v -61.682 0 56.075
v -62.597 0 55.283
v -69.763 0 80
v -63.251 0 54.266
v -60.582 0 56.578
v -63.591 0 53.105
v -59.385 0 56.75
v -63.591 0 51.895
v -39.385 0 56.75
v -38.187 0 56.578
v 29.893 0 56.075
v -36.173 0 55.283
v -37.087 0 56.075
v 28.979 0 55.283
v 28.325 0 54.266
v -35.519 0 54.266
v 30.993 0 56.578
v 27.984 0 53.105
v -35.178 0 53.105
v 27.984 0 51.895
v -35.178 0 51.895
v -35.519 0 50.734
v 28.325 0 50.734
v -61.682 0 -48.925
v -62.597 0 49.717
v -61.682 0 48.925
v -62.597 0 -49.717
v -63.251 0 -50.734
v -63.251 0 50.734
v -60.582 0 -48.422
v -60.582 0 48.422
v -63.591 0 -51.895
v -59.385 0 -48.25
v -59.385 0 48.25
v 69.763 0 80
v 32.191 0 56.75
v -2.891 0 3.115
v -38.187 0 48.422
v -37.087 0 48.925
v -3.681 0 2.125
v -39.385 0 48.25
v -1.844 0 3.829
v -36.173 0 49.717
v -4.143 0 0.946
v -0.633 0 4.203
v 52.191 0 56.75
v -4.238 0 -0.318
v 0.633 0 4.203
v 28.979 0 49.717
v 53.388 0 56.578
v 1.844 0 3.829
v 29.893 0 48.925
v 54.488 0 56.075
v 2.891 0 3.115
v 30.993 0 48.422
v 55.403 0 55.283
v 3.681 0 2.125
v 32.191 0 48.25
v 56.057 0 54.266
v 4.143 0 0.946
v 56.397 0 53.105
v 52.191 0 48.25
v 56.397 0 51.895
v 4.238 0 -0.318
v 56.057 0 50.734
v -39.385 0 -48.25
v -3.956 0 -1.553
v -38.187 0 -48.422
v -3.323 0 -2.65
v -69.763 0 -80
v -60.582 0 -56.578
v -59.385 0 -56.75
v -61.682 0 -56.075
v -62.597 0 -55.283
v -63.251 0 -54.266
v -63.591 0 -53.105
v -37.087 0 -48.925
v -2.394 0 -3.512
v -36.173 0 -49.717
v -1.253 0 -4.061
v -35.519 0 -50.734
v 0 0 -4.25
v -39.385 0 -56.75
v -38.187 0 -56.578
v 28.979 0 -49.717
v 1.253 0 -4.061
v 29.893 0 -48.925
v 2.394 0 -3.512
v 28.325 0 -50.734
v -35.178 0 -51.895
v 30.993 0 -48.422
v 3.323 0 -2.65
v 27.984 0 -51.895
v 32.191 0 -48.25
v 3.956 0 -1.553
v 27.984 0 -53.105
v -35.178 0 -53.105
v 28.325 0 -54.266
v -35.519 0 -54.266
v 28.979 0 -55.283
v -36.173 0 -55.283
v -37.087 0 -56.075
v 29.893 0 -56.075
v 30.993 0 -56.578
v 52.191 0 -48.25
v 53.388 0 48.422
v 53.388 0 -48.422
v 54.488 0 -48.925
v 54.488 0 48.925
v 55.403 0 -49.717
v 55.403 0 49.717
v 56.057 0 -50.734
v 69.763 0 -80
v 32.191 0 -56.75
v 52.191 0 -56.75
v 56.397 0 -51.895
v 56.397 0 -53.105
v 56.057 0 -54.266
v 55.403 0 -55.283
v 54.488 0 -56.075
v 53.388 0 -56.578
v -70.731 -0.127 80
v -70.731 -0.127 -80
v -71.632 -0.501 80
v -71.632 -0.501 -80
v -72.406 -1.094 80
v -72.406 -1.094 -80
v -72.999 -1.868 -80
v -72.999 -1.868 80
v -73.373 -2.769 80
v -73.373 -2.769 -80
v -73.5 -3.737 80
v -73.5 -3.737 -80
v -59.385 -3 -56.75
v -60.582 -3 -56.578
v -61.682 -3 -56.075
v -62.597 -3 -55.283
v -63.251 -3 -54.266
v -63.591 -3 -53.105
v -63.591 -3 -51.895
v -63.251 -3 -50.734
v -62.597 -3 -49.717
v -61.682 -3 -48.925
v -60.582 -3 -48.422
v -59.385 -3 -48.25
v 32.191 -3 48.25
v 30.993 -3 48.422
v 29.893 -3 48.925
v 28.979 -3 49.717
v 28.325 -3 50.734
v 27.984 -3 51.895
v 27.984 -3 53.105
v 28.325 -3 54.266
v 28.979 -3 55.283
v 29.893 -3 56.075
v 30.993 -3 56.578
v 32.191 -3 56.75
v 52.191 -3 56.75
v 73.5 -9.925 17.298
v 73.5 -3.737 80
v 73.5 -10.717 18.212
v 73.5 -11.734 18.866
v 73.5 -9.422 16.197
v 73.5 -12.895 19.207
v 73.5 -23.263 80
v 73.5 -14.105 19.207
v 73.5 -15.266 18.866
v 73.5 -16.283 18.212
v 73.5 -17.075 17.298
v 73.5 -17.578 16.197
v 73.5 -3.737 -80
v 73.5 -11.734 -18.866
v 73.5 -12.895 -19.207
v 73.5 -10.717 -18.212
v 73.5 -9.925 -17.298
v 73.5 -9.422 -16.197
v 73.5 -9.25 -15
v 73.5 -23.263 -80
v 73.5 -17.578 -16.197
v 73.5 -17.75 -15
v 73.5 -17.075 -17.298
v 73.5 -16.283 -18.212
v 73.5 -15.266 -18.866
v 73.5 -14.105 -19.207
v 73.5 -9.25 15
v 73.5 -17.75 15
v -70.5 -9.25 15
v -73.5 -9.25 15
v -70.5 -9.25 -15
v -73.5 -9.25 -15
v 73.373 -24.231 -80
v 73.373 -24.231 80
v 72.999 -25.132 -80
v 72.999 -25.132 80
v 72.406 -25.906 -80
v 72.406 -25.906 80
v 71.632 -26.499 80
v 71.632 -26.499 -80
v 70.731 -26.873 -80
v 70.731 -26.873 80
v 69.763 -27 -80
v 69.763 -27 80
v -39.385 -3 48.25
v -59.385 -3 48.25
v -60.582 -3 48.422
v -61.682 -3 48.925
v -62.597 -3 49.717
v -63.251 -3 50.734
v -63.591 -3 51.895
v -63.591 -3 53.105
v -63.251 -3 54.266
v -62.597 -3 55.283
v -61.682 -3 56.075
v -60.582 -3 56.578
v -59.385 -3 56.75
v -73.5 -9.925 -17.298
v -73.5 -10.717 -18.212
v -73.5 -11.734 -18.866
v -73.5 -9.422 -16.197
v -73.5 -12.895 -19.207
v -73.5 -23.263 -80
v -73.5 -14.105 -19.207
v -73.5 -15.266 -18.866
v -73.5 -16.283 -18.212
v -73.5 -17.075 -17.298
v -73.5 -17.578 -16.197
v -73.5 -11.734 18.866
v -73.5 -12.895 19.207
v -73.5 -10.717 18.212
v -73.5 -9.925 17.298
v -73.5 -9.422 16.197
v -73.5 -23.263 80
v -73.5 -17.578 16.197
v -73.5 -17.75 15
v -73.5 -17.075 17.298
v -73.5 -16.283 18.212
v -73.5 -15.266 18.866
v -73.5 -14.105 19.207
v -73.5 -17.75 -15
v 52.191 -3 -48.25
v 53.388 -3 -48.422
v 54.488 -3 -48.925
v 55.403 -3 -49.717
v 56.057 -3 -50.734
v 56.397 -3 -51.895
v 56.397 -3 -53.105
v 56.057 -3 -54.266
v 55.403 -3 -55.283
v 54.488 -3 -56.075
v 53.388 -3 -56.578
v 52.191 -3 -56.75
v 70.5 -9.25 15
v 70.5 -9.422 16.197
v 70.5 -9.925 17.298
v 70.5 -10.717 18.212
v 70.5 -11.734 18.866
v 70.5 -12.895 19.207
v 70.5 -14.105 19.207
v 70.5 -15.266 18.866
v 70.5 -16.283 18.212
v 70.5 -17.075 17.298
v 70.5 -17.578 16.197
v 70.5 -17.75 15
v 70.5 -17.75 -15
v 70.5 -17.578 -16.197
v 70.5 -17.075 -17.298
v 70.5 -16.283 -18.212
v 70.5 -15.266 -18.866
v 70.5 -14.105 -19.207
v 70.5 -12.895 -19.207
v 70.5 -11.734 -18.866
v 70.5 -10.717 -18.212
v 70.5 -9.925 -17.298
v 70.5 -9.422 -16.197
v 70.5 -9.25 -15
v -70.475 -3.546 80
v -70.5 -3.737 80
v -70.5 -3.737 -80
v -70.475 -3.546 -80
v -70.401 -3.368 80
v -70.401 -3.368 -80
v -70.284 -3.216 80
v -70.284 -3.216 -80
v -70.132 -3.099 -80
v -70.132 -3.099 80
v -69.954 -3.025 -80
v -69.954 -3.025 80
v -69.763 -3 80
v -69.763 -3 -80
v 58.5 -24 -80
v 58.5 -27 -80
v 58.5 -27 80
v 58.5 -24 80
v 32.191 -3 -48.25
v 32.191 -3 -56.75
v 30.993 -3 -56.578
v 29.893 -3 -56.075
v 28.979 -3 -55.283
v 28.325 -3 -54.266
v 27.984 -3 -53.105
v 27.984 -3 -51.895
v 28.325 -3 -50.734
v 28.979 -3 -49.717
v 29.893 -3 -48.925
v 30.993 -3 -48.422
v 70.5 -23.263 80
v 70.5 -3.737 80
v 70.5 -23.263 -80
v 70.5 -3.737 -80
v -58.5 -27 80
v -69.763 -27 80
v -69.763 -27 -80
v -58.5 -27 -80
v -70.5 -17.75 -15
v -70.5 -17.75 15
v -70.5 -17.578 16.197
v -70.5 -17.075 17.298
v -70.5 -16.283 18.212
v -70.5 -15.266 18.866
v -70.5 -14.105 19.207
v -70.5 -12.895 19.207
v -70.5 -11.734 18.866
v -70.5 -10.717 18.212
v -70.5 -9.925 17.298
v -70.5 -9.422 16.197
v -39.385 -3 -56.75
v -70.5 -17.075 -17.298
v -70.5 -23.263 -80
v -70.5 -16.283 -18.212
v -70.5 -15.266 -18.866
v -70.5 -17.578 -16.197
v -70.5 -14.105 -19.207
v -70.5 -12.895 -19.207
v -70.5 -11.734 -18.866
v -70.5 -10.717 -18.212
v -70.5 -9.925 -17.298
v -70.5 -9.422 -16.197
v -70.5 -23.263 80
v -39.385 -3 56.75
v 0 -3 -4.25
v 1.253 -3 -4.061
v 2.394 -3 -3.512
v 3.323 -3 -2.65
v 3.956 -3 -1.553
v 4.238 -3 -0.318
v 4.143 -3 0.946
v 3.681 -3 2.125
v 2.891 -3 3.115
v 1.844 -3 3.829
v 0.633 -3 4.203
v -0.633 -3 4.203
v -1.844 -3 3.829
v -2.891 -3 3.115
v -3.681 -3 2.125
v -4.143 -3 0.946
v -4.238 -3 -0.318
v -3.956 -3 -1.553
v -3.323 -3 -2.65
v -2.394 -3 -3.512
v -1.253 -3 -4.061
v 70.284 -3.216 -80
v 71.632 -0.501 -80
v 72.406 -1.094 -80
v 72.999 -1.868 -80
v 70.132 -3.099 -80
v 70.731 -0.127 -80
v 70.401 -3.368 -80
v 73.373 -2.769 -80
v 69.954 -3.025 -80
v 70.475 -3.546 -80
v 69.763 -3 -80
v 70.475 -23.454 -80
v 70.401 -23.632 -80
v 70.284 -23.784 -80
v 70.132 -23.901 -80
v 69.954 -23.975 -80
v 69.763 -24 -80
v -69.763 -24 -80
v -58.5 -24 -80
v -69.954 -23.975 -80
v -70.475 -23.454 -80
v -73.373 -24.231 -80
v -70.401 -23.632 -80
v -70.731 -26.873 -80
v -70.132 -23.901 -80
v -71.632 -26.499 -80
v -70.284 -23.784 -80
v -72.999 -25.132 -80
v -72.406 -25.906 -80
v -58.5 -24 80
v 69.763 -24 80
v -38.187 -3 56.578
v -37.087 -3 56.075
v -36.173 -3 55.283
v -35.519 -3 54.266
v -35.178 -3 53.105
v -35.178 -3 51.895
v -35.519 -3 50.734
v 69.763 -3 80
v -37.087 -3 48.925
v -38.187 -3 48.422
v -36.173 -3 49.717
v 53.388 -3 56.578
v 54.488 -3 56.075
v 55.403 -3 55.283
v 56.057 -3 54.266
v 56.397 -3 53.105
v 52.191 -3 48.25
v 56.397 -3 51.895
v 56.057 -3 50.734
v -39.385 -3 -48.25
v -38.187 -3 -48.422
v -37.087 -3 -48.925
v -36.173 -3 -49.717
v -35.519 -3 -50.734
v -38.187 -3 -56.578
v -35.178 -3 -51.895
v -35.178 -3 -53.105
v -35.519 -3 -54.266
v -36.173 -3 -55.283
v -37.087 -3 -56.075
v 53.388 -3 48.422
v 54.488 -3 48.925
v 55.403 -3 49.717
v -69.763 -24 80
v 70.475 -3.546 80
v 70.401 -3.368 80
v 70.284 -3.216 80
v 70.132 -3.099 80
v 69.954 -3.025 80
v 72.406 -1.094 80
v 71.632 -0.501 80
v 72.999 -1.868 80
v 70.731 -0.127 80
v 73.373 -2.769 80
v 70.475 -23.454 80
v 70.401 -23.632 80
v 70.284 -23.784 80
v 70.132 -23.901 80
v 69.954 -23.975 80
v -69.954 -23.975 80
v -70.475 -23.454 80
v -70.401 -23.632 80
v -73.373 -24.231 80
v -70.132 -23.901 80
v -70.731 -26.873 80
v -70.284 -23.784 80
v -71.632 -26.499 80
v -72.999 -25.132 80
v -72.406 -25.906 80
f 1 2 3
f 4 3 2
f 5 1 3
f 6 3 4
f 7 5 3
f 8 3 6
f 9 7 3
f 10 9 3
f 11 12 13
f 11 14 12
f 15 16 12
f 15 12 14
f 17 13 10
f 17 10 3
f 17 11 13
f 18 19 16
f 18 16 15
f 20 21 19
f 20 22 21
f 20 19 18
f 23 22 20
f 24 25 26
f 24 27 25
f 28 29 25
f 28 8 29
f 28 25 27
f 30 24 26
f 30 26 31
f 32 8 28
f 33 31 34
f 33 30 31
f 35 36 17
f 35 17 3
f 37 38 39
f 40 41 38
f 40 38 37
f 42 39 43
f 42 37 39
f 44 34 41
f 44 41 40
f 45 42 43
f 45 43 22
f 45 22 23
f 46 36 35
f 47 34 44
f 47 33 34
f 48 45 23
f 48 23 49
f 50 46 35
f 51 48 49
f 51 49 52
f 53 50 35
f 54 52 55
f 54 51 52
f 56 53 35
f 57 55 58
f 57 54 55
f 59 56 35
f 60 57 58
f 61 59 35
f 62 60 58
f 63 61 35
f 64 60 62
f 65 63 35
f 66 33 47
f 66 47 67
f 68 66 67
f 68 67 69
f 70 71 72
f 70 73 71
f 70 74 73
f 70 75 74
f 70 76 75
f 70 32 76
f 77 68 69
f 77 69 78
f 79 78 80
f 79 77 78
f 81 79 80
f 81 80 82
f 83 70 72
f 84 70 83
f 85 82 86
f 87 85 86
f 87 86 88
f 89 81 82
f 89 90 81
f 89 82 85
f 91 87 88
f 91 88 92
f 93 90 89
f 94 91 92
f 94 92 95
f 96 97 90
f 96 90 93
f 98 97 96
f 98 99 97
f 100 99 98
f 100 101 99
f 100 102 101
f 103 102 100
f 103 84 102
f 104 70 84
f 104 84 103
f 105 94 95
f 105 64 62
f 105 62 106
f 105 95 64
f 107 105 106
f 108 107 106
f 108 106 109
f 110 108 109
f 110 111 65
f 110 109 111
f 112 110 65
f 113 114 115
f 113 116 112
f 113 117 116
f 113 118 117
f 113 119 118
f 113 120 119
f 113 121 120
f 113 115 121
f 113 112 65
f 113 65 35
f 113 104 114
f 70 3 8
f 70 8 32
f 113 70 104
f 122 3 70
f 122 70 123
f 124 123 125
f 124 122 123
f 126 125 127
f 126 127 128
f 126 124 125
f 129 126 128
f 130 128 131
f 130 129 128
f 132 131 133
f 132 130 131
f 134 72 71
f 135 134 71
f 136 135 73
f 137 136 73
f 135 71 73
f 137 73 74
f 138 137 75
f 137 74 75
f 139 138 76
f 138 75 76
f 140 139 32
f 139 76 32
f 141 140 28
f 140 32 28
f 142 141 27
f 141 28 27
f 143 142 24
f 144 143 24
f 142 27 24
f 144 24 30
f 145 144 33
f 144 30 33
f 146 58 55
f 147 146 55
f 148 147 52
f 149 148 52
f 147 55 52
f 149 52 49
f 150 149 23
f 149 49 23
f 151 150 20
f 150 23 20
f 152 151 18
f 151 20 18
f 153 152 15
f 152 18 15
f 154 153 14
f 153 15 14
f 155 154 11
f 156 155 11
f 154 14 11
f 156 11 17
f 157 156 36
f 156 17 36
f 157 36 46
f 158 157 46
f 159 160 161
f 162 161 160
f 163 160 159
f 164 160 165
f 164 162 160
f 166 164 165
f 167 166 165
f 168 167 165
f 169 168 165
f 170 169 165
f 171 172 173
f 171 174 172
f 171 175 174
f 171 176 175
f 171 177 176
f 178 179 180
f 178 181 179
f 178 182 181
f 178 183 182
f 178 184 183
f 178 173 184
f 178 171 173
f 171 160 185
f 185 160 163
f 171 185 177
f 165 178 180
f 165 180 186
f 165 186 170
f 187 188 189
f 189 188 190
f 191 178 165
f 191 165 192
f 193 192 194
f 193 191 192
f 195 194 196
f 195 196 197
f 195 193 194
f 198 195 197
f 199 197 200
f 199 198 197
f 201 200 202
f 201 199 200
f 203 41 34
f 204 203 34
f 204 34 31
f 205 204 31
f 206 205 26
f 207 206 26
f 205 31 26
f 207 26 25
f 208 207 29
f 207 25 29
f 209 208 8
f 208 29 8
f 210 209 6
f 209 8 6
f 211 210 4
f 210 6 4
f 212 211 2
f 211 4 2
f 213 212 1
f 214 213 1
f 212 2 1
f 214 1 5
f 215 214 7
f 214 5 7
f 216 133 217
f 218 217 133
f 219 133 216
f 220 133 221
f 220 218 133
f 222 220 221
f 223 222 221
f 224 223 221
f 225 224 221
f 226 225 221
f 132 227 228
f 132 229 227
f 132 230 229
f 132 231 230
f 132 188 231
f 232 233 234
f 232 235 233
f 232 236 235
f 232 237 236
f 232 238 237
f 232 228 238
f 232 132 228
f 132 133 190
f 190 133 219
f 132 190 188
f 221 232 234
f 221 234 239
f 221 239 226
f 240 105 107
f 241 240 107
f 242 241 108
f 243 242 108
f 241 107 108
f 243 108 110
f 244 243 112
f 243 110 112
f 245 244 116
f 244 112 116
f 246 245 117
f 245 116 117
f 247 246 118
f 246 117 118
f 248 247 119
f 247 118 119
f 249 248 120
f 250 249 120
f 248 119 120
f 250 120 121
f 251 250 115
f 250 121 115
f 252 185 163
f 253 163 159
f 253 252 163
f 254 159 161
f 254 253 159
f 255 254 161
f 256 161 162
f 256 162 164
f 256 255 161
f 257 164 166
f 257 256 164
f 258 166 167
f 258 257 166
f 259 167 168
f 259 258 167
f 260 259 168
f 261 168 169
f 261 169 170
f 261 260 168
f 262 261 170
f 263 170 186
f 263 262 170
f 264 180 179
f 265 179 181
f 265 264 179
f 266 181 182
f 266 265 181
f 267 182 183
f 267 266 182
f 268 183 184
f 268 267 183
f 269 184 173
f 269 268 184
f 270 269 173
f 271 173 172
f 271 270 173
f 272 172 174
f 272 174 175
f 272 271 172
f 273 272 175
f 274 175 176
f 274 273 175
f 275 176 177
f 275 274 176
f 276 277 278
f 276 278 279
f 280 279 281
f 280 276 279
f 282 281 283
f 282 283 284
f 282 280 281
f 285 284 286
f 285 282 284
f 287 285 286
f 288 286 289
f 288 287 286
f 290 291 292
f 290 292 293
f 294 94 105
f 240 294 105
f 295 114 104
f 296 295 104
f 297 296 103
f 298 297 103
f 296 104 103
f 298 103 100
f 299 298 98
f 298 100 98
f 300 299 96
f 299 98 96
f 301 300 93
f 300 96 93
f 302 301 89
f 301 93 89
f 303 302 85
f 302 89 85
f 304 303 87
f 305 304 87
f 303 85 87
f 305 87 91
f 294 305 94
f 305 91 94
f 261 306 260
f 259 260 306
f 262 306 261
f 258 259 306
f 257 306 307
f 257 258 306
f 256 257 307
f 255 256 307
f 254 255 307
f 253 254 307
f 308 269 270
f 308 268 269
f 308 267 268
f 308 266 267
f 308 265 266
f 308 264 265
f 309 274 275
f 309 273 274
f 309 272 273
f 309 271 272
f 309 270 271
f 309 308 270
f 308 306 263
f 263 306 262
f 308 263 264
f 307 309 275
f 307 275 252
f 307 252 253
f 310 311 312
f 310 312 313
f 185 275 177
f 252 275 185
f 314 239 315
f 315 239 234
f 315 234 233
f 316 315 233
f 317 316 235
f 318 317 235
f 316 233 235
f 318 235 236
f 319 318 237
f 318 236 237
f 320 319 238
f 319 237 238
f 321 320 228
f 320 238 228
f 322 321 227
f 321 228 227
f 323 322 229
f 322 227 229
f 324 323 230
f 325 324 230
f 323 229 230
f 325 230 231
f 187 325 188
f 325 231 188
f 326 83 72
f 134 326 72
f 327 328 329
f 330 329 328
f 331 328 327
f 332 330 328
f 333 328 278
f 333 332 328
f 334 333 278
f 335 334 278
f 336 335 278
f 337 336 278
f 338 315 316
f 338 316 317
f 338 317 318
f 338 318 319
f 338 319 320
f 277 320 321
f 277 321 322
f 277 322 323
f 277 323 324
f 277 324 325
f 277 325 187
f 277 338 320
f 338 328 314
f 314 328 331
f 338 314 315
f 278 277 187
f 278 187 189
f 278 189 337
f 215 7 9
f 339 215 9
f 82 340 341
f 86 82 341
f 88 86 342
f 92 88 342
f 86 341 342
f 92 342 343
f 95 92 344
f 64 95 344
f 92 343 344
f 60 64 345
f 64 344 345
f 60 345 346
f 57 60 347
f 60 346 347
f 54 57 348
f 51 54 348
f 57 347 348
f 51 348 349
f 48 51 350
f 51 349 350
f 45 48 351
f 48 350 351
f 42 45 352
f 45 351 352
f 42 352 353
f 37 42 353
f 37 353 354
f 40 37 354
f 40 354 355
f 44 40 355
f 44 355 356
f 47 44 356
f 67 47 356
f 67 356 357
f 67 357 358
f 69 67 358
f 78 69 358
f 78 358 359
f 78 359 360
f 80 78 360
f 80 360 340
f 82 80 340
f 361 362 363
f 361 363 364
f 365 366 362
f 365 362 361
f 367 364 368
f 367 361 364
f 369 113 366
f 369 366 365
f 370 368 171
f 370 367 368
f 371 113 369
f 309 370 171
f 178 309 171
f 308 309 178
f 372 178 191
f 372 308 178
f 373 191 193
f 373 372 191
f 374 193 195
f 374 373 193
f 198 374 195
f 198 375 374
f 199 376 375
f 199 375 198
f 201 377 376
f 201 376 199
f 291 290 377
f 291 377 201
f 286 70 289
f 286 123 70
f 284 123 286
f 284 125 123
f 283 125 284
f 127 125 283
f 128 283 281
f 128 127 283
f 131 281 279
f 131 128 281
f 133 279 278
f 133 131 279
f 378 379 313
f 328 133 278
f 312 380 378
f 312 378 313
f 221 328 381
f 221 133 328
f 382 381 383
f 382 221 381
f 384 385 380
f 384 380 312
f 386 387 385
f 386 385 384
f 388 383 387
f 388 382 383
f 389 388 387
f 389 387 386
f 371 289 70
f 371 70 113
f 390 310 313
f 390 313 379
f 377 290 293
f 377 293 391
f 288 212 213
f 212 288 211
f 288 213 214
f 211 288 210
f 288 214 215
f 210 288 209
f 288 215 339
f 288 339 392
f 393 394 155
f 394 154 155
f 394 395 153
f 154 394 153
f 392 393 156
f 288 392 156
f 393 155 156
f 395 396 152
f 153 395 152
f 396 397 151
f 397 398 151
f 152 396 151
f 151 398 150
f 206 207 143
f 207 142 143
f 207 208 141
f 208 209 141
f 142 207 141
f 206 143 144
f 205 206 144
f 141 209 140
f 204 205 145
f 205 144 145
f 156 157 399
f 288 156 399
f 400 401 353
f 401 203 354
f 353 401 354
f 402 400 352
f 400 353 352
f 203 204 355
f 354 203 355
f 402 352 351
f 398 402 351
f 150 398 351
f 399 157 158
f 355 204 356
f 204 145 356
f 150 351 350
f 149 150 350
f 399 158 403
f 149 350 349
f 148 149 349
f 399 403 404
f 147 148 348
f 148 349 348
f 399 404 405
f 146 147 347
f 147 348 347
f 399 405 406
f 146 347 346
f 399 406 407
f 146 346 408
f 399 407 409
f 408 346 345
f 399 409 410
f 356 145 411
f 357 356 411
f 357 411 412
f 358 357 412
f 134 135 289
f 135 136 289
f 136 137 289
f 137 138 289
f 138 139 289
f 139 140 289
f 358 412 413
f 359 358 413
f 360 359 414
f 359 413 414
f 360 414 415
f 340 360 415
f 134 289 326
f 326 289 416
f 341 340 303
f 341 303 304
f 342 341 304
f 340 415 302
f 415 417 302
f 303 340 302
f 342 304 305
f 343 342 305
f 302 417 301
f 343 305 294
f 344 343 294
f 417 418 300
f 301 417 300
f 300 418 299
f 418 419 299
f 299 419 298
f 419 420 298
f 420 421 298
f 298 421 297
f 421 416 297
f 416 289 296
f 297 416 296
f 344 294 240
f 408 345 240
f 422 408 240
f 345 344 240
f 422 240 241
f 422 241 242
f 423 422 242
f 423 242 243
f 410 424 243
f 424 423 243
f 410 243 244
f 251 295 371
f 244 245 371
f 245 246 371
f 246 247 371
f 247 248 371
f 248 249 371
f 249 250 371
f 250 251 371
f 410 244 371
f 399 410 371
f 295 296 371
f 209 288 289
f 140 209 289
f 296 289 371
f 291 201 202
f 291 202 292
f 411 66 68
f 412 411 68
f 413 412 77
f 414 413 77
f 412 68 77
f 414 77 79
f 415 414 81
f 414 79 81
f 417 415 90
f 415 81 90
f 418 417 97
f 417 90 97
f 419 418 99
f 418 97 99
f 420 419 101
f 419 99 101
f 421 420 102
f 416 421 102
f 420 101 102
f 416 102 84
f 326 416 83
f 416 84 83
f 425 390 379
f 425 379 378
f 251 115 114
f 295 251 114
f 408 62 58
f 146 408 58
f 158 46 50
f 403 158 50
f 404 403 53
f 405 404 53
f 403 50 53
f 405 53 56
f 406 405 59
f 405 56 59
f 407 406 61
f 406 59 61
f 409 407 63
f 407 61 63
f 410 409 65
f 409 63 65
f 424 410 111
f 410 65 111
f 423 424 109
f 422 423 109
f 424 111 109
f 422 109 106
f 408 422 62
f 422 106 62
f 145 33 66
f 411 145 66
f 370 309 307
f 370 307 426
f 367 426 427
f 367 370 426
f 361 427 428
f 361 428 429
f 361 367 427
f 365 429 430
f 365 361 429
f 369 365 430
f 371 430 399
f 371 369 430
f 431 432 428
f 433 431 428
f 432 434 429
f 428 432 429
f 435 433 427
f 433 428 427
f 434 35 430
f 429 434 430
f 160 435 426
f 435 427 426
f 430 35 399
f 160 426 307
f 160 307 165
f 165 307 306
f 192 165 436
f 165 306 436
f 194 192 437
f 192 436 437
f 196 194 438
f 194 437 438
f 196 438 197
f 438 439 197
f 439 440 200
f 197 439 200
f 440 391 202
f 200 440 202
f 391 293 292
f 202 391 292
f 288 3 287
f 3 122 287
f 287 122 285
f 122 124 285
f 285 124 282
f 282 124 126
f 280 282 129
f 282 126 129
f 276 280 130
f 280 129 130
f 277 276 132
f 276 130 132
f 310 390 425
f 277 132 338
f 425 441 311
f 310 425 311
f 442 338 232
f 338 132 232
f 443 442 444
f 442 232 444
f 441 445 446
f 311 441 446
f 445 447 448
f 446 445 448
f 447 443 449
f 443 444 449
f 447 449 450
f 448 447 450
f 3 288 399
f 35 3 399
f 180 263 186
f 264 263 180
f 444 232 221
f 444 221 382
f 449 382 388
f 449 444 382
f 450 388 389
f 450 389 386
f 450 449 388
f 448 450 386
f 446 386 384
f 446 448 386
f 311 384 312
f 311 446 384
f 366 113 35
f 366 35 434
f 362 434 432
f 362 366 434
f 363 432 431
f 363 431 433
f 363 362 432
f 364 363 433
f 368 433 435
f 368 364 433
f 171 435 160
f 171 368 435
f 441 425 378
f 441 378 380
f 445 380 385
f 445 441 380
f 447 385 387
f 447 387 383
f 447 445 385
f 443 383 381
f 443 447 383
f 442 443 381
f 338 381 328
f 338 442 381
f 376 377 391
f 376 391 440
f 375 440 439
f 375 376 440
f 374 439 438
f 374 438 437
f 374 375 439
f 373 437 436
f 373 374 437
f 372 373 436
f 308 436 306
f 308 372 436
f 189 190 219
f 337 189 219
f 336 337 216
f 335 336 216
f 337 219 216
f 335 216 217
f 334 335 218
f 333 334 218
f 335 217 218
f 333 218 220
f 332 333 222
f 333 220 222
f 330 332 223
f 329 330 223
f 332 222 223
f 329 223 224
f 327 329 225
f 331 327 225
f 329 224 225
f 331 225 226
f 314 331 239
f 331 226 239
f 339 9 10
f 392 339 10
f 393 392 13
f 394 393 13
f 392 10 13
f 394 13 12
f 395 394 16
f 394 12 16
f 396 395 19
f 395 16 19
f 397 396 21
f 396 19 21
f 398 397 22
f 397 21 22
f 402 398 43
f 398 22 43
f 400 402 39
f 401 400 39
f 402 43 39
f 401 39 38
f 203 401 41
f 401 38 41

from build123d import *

# Parameters (mm, degrees)
SKETCH1_W                      = 141
SKETCH1_H                      = 160
BASE_FLANGE3_DEPTH             = 3
EDGE_FLANGE6_STRIP_W           = 13.4732
EDGE_FLANGE6_STRIP_H           = 3
EDGE_FLANGE6_STRIP_CUT_DEPTH   = 160
EDGE_FLANGE6_STRIP_2_W         = 13.4732
EDGE_FLANGE6_STRIP_2_H         = 3
EDGE_FLANGE6_STRIP_CUT_2_DEPTH = 160
EDGE_FLANGE6_DEPTH             = 160
EDGE_FLANGE6_BEND_DEPTH        = 160
EDGE_FLANGE8_STRIP_W           = 13.4732
EDGE_FLANGE8_STRIP_H           = 3
EDGE_FLANGE8_STRIP_CUT_DEPTH   = 160
EDGE_FLANGE8_STRIP_2_W         = 13.4732
EDGE_FLANGE8_STRIP_2_H         = 3
EDGE_FLANGE8_STRIP_CUT_2_DEPTH = 160
EDGE_FLANGE8_DEPTH             = 160
EDGE_FLANGE8_BEND_DEPTH        = 160
SKETCH76_R                     = 4.25
CUT_EXTRUDE1_DEPTH             = 10
CUT_EXTRUDE3_START             = -10
SKETCH80_R                     = 4.25
CUT_EXTRUDE3_DEPTH             = 10
CUT_EXTRUDE4_DEPTH             = 10
SKETCH85_R                     = 4.25
CUT_EXTRUDE5_DEPTH             = 10


# Sheet-metal steps are written as plain solids
with BuildPart() as part:
    # Sketch1 → Base-Flange3 (new body)
    with BuildSketch(Plane(origin=(0, 0, 0), x_dir=(1, 0, 0), z_dir=(0, 1, 0))):
        Rectangle(SKETCH1_W, SKETCH1_H)
    extrude(amount=-BASE_FLANGE3_DEPTH)

    # Edge-Flange6 strip (across the edge) → Edge-Flange6 strip cut (cut)
    with BuildSketch(Plane(origin=(-70.5, -3, 80), x_dir=(1, 0, 0), z_dir=(0, 0, -1))):
        with Locations((-6, -1.5)):
            Rectangle(EDGE_FLANGE6_STRIP_W, EDGE_FLANGE6_STRIP_H)
    extrude(amount=EDGE_FLANGE6_STRIP_CUT_DEPTH, mode=Mode.SUBTRACT)

    # Edge-Flange6 strip 2 (across the edge) → Edge-Flange6 strip cut 2 (cut)
    with BuildSketch(Plane(origin=(70.5, -3, -80), x_dir=(-1, 0, 0), z_dir=(0, 0, 1))):
        with Locations((-6, -1.5)):
            Rectangle(EDGE_FLANGE6_STRIP_2_W, EDGE_FLANGE6_STRIP_2_H)
    extrude(amount=EDGE_FLANGE6_STRIP_CUT_2_DEPTH, mode=Mode.SUBTRACT)

    # Edge-Flange6 section (across the edge) → Edge-Flange6 (add)
    with BuildSketch(Plane(origin=(-70.5, -3, 80), x_dir=(1, 0, 0), z_dir=(0, 0, -1))):
        with BuildLine():
            Line((-3, 0.7366), (-3, 21))
            Line((-3, 21), (0, 21))
            Line((0, 21), (0, 0.7366))
            ThreePointArc((0, 0.7366), (0.215745145, 0.215745145), (0.7366, 0))
            Line((0.7366, 0), (0.7366, -3))
            ThreePointArc((0.7366, -3), (-1.905575199, -1.905575199), (-3, 0.7366))
        make_face()
    extrude(amount=EDGE_FLANGE6_DEPTH)

    # Edge-Flange6 section 2 (across the edge) → Edge-Flange6 bend (add)
    with BuildSketch(Plane(origin=(70.5, -3, -80), x_dir=(-1, 0, 0), z_dir=(0, 0, 1))):
        with BuildLine():
            Line((-3, 0.7366), (-3, 21))
            Line((-3, 21), (0, 21))
            Line((0, 21), (0, 0.7366))
            ThreePointArc((0, 0.7366), (0.215745145, 0.215745145), (0.7366, 0))
            Line((0.7366, 0), (0.7366, -3))
            ThreePointArc((0.7366, -3), (-1.905575199, -1.905575199), (-3, 0.7366))
        make_face()
    extrude(amount=EDGE_FLANGE6_BEND_DEPTH)

    # Edge-Flange8 strip (across the edge) → Edge-Flange8 strip cut (cut)
    with BuildSketch(Plane(origin=(-70.5, -24, 80), x_dir=(0, 1, 0), z_dir=(0, 0, -1))):
        with Locations((-6, -1.5)):
            Rectangle(EDGE_FLANGE8_STRIP_W, EDGE_FLANGE8_STRIP_H)
    extrude(amount=EDGE_FLANGE8_STRIP_CUT_DEPTH, mode=Mode.SUBTRACT)

    # Edge-Flange8 strip 2 (across the edge) → Edge-Flange8 strip cut 2 (cut)
    with BuildSketch(Plane(origin=(70.5, -24, -80), x_dir=(0, 1, 0), z_dir=(0, 0, 1))):
        with Locations((-6, -1.5)):
            Rectangle(EDGE_FLANGE8_STRIP_2_W, EDGE_FLANGE8_STRIP_2_H)
    extrude(amount=EDGE_FLANGE8_STRIP_CUT_2_DEPTH, mode=Mode.SUBTRACT)

    # Edge-Flange8 section (across the edge) → Edge-Flange8 (add)
    with BuildSketch(Plane(origin=(-70.5, -24, 80), x_dir=(0, 1, 0), z_dir=(0, 0, -1))):
        with BuildLine():
            Line((-3, 0.7366), (-3, 12))
            Line((-3, 12), (0, 12))
            Line((0, 12), (0, 0.7366))
            ThreePointArc((0, 0.7366), (0.215745145, 0.215745145), (0.7366, 0))
            Line((0.7366, 0), (0.7366, -3))
            ThreePointArc((0.7366, -3), (-1.905575199, -1.905575199), (-3, 0.7366))
        make_face()
    extrude(amount=EDGE_FLANGE8_DEPTH)

    # Edge-Flange8 section 2 (across the edge) → Edge-Flange8 bend (add)
    with BuildSketch(Plane(origin=(70.5, -24, -80), x_dir=(0, 1, 0), z_dir=(0, 0, 1))):
        with BuildLine():
            Line((-3, 0.7366), (-3, 12))
            Line((-3, 12), (0, 12))
            Line((0, 12), (0, 0.7366))
            ThreePointArc((0, 0.7366), (0.215745145, 0.215745145), (0.7366, 0))
            Line((0.7366, 0), (0.7366, -3))
            ThreePointArc((0.7366, -3), (-1.905575199, -1.905575199), (-3, 0.7366))
        make_face()
    extrude(amount=EDGE_FLANGE8_BEND_DEPTH)

    # Sketch76 → Cut-Extrude1 (cut)
    with BuildSketch(Plane.ZY.offset(73.5)):
        with Locations((-15, -13.5)):
            Circle(SKETCH76_R)
        with BuildLine():
            Line((15, -9.25), (-15, -9.25))
            ThreePointArc((-15, -9.25), (-11.99479618, -10.49479618), (-10.75, -13.5))
            ThreePointArc((-10.75, -13.5), (-11.99479618, -16.50520382), (-15, -17.75))
            Line((-15, -17.75), (15, -17.75))
            ThreePointArc((15, -17.75), (10.75, -13.5), (15, -9.25))
        make_face()
        with Locations((15, -13.5)):
            Circle(SKETCH76_R)
    extrude(amount=-CUT_EXTRUDE1_DEPTH, mode=Mode.SUBTRACT)

    # Sketch80 → Cut-Extrude3 (cut)
    with BuildSketch(Plane(origin=(73.5, 0, 0), x_dir=(0, 0, -1), z_dir=(1, 0, 0)).offset(CUT_EXTRUDE3_START)):
        with Locations((-15, -13.5)):
            Circle(SKETCH80_R)
        with BuildLine():
            Line((15, -9.25), (-15, -9.25))
            ThreePointArc((-15, -9.25), (-11.99479618, -10.49479618), (-10.75, -13.5))
            ThreePointArc((-10.75, -13.5), (-11.99479618, -16.50520382), (-15, -17.75))
            Line((-15, -17.75), (15, -17.75))
            ThreePointArc((15, -17.75), (10.75, -13.5), (15, -9.25))
        make_face()
        with Locations((15, -13.5)):
            Circle(SKETCH80_R)
    extrude(amount=CUT_EXTRUDE3_DEPTH, mode=Mode.SUBTRACT)

    # Sketch84 → Cut-Extrude4 (cut)
    with BuildSketch(Plane(origin=(0, 0, 0), x_dir=(1, 0, 0), z_dir=(0, 1, 0))):
        with BuildLine():
            Line((32.190582692, -56.75), (52.190582692, -56.75))
            ThreePointArc((52.190582692, -56.75), (56.440582692, -52.5), (52.190582692, -48.25))
            Line((52.190582692, -48.25), (32.190582692, -48.25))
            ThreePointArc((32.190582692, -48.25), (27.940582692, -52.5), (32.190582692, -56.75))
        make_face()
        with BuildLine():
            Line((-59.384714022, -56.75), (-39.384714022, -56.75))
            ThreePointArc((-39.384714022, -56.75), (-35.134714022, -52.5), (-39.384714022, -48.25))
            Line((-39.384714022, -48.25), (-59.384714022, -48.25))
            ThreePointArc((-59.384714022, -48.25), (-63.634714022, -52.5), (-59.384714022, -56.75))
        make_face()
        with BuildLine():
            Line((-59.384714022, 48.25), (-39.384714022, 48.25))
            ThreePointArc((-39.384714022, 48.25), (-35.134714022, 52.5), (-39.384714022, 56.75))
            Line((-39.384714022, 56.75), (-59.384714022, 56.75))
            ThreePointArc((-59.384714022, 56.75), (-63.634714022, 52.5), (-59.384714022, 48.25))
        make_face()
        with BuildLine():
            Line((32.190582692, 48.25), (52.190582692, 48.25))
            ThreePointArc((52.190582692, 48.25), (56.440582692, 52.5), (52.190582692, 56.75))
            Line((52.190582692, 56.75), (32.190582692, 56.75))
            ThreePointArc((32.190582692, 56.75), (27.940582692, 52.5), (32.190582692, 48.25))
        make_face()
    extrude(amount=-CUT_EXTRUDE4_DEPTH, mode=Mode.SUBTRACT)

    # Sketch85 → Cut-Extrude5 (cut)
    with BuildSketch(Plane.XZ.offset(3)):
        with Locations(Location((0, 0, 0), (0, 0, 270))):
            Circle(SKETCH85_R)
    extrude(amount=-CUT_EXTRUDE5_DEPTH, mode=Mode.SUBTRACT)


solid = part.part
